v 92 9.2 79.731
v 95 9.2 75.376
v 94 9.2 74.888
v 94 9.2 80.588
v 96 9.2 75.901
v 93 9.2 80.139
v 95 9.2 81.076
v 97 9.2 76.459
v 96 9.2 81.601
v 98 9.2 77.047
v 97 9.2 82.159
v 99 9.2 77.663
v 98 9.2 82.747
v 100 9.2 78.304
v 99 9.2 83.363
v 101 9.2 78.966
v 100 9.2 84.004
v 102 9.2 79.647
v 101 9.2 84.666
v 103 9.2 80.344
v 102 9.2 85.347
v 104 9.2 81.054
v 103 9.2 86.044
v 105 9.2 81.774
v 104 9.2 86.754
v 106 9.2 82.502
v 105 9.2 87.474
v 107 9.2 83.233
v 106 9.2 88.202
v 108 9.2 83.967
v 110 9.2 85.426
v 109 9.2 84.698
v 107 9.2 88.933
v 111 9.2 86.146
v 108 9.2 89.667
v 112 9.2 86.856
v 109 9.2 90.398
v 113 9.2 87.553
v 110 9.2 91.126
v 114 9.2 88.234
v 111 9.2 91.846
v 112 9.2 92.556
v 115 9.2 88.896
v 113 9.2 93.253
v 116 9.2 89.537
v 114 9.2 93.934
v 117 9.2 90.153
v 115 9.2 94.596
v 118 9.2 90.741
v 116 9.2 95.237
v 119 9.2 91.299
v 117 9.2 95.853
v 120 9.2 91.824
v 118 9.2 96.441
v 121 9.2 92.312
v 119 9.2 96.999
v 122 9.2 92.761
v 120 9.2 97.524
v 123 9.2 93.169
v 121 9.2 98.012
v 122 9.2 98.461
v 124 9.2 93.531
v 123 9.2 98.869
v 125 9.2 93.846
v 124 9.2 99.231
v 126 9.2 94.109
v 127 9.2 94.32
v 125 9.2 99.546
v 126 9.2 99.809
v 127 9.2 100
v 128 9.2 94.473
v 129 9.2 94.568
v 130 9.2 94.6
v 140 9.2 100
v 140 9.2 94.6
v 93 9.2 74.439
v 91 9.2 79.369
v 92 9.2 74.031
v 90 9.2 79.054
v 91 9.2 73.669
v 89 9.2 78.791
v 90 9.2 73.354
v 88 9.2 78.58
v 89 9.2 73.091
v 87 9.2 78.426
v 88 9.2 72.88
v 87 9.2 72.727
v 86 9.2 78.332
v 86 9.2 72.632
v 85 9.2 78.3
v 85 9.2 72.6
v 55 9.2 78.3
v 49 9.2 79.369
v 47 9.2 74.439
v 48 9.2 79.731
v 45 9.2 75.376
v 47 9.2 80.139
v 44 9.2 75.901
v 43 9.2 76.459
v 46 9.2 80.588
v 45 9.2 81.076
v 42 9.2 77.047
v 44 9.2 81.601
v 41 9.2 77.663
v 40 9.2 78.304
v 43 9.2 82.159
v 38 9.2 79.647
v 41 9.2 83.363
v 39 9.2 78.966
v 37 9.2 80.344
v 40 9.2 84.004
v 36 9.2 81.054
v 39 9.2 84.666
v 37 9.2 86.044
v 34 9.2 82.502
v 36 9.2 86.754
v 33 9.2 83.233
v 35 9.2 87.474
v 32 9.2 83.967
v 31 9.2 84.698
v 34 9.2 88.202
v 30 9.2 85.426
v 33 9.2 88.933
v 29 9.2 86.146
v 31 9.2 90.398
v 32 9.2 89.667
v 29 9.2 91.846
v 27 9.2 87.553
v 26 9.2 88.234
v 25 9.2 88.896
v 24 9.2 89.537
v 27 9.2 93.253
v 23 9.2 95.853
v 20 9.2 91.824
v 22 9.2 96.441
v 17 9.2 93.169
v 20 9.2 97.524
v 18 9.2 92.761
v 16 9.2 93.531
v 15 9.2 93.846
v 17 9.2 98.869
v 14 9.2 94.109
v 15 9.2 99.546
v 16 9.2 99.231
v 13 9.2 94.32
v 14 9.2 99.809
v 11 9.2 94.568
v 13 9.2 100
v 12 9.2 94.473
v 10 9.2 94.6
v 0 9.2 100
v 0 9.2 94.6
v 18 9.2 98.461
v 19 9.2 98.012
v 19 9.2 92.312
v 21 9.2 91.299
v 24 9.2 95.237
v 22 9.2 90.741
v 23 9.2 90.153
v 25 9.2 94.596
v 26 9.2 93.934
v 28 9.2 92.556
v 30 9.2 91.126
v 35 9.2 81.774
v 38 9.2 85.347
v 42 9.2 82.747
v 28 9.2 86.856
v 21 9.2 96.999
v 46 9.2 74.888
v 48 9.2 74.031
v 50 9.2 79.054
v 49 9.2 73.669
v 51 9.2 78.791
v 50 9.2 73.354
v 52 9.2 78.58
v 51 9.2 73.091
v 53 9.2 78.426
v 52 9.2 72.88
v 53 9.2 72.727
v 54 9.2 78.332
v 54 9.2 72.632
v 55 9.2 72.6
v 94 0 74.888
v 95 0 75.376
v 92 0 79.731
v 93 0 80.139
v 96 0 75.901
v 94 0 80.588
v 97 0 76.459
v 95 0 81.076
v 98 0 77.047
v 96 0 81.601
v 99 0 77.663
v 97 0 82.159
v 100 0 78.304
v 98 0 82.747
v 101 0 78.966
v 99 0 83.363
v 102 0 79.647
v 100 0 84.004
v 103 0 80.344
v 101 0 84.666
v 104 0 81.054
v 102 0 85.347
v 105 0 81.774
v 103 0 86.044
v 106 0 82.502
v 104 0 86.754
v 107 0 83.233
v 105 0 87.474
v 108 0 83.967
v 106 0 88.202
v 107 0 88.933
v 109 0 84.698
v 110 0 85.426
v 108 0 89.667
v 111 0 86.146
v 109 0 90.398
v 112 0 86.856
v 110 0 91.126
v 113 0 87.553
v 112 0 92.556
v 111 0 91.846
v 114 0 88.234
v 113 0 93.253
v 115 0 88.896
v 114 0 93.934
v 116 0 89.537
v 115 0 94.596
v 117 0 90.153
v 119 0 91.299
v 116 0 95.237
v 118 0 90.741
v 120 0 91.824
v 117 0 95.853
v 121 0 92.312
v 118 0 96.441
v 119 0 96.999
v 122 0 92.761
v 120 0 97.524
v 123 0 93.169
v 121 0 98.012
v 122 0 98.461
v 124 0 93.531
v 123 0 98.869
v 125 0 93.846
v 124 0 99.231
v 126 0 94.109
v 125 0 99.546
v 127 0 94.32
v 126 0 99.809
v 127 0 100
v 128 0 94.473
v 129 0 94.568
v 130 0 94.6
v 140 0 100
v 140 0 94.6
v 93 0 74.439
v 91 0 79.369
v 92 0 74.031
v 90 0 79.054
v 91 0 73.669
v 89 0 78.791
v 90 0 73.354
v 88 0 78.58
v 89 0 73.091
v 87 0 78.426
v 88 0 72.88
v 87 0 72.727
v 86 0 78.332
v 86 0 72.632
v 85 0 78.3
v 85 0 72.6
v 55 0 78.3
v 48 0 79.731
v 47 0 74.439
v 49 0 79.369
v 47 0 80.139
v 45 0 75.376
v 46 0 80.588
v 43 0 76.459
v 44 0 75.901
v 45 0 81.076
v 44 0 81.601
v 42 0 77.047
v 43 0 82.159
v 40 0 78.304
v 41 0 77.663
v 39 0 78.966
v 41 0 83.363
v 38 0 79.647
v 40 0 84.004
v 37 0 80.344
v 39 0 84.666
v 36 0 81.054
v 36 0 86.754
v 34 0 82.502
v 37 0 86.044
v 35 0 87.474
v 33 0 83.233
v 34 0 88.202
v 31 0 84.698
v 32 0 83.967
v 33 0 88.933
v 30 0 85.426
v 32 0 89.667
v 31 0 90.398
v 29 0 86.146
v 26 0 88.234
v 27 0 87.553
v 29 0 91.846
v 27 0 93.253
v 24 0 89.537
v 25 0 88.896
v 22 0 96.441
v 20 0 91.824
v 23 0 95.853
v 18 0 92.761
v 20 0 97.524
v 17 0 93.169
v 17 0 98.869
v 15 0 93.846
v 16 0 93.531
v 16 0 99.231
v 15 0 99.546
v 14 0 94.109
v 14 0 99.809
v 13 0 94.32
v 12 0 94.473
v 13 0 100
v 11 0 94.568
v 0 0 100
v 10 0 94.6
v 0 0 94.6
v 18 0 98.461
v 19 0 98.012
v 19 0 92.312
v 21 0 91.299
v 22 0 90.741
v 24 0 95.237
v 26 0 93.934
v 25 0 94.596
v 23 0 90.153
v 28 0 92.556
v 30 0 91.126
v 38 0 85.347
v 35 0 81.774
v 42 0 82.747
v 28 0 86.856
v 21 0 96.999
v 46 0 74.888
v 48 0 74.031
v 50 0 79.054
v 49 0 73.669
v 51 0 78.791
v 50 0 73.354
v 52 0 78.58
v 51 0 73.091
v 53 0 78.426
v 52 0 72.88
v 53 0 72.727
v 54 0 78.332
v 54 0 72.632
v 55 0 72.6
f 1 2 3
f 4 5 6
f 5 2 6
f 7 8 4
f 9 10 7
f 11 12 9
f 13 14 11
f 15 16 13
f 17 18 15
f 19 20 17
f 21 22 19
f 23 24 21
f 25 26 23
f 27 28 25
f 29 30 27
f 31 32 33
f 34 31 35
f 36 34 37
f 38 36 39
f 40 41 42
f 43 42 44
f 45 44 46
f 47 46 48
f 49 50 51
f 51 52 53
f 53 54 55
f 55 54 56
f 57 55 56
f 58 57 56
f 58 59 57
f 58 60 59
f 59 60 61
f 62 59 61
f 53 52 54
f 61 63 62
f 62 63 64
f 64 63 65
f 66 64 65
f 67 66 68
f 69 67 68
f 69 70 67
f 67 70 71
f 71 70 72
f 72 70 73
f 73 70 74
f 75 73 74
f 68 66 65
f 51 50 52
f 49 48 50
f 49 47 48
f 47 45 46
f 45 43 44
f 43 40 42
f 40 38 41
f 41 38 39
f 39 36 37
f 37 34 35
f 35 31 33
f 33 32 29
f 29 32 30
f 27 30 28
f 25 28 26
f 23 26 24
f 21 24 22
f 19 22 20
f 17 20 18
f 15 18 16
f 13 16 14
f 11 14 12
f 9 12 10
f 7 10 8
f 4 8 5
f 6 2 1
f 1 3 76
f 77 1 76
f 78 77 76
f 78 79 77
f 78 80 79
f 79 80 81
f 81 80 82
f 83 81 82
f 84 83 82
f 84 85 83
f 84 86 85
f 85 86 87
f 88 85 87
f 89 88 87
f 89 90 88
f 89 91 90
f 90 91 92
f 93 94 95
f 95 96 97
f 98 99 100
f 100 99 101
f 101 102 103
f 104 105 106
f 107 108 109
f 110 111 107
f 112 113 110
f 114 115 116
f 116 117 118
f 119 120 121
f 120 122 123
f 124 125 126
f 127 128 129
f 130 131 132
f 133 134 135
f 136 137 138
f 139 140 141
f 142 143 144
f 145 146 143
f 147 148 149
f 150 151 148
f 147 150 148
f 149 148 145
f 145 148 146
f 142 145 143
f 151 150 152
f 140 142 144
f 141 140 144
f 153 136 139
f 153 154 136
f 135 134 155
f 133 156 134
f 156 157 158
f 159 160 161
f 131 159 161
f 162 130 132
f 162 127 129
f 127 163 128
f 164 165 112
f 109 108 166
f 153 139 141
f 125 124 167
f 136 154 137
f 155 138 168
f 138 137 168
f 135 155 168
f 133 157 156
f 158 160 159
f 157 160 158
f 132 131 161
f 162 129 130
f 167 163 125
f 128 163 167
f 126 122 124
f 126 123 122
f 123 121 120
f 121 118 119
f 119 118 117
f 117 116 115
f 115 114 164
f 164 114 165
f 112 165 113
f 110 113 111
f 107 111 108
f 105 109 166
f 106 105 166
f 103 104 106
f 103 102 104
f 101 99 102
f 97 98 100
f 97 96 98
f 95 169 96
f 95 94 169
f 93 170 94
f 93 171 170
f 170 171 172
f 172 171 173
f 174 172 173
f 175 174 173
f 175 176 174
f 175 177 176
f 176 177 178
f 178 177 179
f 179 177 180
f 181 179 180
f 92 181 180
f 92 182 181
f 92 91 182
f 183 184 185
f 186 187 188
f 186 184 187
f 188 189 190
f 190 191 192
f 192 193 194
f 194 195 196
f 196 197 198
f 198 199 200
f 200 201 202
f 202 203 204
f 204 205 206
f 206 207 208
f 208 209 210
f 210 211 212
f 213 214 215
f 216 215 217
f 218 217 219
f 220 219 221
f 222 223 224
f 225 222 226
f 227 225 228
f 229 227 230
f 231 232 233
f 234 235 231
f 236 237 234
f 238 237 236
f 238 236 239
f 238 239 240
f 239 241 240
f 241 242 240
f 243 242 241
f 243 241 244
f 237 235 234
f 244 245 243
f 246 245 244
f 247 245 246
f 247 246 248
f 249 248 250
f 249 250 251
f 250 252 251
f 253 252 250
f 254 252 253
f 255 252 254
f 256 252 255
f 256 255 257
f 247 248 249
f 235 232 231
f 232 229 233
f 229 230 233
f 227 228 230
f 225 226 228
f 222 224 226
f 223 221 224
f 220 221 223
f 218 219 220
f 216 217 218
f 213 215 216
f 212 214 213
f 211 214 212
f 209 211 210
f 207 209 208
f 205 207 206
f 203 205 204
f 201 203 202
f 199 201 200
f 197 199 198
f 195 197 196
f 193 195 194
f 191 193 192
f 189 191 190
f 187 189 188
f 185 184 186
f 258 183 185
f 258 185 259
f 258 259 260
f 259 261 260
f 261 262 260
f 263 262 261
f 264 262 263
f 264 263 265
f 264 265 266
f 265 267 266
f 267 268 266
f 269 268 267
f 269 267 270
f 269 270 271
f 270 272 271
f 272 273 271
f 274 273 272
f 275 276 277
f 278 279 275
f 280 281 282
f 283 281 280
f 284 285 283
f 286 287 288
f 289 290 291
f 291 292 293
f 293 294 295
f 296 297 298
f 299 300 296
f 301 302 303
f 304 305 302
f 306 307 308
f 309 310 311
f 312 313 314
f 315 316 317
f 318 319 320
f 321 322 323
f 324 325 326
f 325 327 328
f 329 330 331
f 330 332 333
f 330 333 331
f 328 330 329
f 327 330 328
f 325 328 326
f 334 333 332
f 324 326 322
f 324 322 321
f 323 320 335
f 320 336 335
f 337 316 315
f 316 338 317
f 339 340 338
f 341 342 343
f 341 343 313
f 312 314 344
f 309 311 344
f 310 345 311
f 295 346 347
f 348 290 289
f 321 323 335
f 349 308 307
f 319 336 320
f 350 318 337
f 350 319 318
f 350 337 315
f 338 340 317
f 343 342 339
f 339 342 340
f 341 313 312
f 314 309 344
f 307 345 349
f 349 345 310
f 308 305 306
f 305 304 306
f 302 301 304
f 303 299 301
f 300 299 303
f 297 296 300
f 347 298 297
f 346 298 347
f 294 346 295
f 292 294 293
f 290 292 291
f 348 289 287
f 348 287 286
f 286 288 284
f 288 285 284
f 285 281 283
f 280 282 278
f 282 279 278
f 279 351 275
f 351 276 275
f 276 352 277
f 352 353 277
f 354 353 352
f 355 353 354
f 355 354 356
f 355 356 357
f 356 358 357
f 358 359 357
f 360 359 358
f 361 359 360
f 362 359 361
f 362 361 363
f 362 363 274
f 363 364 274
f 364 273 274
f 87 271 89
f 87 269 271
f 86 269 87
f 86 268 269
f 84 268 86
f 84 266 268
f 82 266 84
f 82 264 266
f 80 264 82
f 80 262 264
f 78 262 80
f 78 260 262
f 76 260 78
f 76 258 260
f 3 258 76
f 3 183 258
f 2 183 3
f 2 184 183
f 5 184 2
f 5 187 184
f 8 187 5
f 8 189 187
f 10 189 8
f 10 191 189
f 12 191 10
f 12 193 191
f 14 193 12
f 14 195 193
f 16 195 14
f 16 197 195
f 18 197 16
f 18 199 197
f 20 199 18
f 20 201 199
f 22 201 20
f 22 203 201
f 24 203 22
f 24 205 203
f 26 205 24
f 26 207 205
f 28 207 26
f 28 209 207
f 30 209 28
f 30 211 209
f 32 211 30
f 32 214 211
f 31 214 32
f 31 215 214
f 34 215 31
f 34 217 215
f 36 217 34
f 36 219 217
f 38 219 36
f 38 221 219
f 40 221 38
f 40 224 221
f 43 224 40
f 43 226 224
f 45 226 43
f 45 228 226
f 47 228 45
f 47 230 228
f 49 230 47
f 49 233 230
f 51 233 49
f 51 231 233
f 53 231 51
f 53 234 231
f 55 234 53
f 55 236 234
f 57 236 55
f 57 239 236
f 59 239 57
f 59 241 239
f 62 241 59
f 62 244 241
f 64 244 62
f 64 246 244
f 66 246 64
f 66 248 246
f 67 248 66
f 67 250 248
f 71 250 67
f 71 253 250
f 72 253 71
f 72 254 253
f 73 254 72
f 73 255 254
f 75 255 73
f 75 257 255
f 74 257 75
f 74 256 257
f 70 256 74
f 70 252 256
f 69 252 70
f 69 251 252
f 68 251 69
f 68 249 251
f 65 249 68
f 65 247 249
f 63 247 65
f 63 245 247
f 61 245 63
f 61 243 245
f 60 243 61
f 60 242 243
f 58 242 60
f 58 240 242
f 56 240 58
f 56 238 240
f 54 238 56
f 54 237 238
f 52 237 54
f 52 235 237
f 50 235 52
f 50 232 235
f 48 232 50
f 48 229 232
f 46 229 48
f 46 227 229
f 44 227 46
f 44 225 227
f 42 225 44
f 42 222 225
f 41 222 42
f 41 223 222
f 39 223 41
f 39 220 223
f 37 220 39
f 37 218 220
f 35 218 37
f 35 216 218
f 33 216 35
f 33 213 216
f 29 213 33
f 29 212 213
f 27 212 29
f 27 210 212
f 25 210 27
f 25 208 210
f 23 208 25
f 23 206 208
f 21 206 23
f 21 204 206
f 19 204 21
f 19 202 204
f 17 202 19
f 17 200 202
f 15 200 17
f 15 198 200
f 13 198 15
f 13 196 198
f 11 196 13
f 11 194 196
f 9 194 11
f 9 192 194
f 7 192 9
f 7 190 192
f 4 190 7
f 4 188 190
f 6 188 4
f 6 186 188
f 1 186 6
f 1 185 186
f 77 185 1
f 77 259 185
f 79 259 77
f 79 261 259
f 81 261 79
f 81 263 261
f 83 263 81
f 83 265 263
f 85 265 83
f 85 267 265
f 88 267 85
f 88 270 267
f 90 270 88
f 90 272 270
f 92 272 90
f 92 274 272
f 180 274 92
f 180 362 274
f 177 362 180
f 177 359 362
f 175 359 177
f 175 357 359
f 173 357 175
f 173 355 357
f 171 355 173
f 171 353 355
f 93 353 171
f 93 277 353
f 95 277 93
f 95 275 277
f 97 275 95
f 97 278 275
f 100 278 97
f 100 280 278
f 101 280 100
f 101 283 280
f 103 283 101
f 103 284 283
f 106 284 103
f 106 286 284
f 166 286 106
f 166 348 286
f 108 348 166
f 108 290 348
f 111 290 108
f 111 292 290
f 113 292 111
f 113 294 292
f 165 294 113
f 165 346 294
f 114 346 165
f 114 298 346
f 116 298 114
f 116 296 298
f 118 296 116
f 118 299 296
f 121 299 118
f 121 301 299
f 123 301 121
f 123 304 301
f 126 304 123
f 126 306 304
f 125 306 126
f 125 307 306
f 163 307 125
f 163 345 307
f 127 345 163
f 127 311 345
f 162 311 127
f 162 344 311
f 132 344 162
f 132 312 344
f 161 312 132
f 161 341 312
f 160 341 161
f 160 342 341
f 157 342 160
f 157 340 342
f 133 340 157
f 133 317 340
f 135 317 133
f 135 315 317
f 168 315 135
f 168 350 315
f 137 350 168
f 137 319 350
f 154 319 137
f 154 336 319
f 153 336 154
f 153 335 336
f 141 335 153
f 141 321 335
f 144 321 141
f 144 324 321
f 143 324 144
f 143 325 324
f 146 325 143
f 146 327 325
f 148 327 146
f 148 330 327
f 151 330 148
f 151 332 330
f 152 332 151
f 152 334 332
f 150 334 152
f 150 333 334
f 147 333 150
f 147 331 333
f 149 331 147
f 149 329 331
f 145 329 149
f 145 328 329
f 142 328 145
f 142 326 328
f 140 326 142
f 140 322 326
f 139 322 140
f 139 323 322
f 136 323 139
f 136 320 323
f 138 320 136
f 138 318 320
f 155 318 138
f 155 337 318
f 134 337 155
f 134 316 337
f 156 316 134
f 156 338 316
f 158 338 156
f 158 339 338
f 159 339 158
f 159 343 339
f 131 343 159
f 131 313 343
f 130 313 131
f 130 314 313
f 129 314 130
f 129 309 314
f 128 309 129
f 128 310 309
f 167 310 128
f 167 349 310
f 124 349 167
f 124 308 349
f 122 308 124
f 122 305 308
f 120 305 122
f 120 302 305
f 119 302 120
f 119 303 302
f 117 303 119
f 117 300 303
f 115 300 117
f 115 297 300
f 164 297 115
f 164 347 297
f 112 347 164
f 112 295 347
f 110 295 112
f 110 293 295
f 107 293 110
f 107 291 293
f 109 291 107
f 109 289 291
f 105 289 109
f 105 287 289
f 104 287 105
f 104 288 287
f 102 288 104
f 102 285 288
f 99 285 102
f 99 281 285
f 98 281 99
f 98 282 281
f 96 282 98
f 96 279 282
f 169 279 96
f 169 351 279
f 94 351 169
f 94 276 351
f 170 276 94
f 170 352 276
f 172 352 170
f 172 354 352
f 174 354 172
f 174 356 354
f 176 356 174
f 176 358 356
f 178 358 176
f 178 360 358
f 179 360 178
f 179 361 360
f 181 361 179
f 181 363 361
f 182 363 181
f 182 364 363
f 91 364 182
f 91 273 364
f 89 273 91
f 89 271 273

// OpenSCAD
// GetCigar Basket v4: CLOSED, CONTINUOUS CURVED FRONT FINGER RIM.
// Fixes v3: an open U-notch cut left exposed ends of honeycomb strands.
// The new 5.4-mm tall, 9.2-mm deep curved belt JOINS the cell ends,
// becoming a solid, smooth protective upper edge.
// Exact base: original v3 STL; do not replace, rescale, or remodel.
//
// Coordinates: basket X=0..140, Y=0..350, Z=0..100 (millimeters).
// Front short wall: Y=0.  Label region X=32.5..107.5, Z=30..70.
// Smooth U notch from X=10..130, deepest Z=78, unchanged nominally.
// Band remains ABOVE Z=72.6, clear of label at Z<=70.
// All additions stay strictly WITHIN the ORIGINAL external envelope.
//
// Test in Elegoo Slicer for visible connected rim, no stranded honeycomb
// ends; then test-printed PETG strength before handling loaded baskets.

base_stl = "../stl/L_gridfinity_30mm_center_rib/basket_140x350_v3_finger_scoop.stl";
basket_w = 140;
basket_h = 100;
notch_left = 10;
notch_right = 130;
notch_flat_l = 55;
notch_flat_r = 85;
notch_low_z = 78;

// Nominal depth of existing cut: Y = -1..9 mm.
// This positive belt reaches the existing cut and enough of the solid web
// below the notch to create a real manifold union (NOT face contact).
rim_depth_y = 9.2;
rim_height_z = 5.4;
rim_top_overlap = 0.3;
curve_segments = 140;

function smoothstep(t) = t*t*(3-2*t);

function notch_z(x) =
    (x <= notch_left || x >= notch_right) ? basket_h :
    x < notch_flat_l ? basket_h - (basket_h-notch_low_z)*smoothstep((x-notch_left)/(notch_flat_l-notch_left)) :
    x <= notch_flat_r ? notch_low_z :
      notch_low_z + (basket_h-notch_low_z)*smoothstep((x-notch_flat_r)/(notch_right-notch_flat_r));

function rim_lower_z(x) = notch_z(x) - rim_height_z;
function rim_upper_z(x) = min(basket_h, notch_z(x) + rim_top_overlap);

// This creates a solid ribbon following the notch, including short horizontal
// extensions to both corner rails (X=0..10, X=130..140). That guarantees
// load transfer into the original outer corners, not just the honeycomb tips.
// We keep the ends and bottom strictly inside original outer bounds.
module curved_front_rim() {
    translate([0, rim_depth_y, 0])
        rotate([90,0,0])
            linear_extrude(height=rim_depth_y, convexity=20)
                polygon(points=concat(
                    [for (i=[0:curve_segments])
                        let(x=basket_w*i/curve_segments)
                        [x, rim_lower_z(x)]],
                    [for (i=[curve_segments:-1:0])
                        let(x=basket_w*i/curve_segments)
                        [x, rim_upper_z(x)]]
                ));
}

// OpenSCAD may fail to convert a fully meshed legacy STL plus a swept
// rim into a CGAL Nef solid. The verified STL therefore uses a robust
// manifold-mesh Boolean union in the accompanying Python builder.
//
// To preview the full assembly without Boolean render, use F5 in OpenSCAD:
// for_export=true exports ONLY the watertight curved rim for the mesh builder.
// The final combined STL is created by src/basket_v4/build_basket_v4.py.
for_export = true;
if (for_export) {
    curved_front_rim();
} else {
    // Fast preview only, not a mesh export.
    %import(base_stl, convexity=15);
    curved_front_rim();
}
